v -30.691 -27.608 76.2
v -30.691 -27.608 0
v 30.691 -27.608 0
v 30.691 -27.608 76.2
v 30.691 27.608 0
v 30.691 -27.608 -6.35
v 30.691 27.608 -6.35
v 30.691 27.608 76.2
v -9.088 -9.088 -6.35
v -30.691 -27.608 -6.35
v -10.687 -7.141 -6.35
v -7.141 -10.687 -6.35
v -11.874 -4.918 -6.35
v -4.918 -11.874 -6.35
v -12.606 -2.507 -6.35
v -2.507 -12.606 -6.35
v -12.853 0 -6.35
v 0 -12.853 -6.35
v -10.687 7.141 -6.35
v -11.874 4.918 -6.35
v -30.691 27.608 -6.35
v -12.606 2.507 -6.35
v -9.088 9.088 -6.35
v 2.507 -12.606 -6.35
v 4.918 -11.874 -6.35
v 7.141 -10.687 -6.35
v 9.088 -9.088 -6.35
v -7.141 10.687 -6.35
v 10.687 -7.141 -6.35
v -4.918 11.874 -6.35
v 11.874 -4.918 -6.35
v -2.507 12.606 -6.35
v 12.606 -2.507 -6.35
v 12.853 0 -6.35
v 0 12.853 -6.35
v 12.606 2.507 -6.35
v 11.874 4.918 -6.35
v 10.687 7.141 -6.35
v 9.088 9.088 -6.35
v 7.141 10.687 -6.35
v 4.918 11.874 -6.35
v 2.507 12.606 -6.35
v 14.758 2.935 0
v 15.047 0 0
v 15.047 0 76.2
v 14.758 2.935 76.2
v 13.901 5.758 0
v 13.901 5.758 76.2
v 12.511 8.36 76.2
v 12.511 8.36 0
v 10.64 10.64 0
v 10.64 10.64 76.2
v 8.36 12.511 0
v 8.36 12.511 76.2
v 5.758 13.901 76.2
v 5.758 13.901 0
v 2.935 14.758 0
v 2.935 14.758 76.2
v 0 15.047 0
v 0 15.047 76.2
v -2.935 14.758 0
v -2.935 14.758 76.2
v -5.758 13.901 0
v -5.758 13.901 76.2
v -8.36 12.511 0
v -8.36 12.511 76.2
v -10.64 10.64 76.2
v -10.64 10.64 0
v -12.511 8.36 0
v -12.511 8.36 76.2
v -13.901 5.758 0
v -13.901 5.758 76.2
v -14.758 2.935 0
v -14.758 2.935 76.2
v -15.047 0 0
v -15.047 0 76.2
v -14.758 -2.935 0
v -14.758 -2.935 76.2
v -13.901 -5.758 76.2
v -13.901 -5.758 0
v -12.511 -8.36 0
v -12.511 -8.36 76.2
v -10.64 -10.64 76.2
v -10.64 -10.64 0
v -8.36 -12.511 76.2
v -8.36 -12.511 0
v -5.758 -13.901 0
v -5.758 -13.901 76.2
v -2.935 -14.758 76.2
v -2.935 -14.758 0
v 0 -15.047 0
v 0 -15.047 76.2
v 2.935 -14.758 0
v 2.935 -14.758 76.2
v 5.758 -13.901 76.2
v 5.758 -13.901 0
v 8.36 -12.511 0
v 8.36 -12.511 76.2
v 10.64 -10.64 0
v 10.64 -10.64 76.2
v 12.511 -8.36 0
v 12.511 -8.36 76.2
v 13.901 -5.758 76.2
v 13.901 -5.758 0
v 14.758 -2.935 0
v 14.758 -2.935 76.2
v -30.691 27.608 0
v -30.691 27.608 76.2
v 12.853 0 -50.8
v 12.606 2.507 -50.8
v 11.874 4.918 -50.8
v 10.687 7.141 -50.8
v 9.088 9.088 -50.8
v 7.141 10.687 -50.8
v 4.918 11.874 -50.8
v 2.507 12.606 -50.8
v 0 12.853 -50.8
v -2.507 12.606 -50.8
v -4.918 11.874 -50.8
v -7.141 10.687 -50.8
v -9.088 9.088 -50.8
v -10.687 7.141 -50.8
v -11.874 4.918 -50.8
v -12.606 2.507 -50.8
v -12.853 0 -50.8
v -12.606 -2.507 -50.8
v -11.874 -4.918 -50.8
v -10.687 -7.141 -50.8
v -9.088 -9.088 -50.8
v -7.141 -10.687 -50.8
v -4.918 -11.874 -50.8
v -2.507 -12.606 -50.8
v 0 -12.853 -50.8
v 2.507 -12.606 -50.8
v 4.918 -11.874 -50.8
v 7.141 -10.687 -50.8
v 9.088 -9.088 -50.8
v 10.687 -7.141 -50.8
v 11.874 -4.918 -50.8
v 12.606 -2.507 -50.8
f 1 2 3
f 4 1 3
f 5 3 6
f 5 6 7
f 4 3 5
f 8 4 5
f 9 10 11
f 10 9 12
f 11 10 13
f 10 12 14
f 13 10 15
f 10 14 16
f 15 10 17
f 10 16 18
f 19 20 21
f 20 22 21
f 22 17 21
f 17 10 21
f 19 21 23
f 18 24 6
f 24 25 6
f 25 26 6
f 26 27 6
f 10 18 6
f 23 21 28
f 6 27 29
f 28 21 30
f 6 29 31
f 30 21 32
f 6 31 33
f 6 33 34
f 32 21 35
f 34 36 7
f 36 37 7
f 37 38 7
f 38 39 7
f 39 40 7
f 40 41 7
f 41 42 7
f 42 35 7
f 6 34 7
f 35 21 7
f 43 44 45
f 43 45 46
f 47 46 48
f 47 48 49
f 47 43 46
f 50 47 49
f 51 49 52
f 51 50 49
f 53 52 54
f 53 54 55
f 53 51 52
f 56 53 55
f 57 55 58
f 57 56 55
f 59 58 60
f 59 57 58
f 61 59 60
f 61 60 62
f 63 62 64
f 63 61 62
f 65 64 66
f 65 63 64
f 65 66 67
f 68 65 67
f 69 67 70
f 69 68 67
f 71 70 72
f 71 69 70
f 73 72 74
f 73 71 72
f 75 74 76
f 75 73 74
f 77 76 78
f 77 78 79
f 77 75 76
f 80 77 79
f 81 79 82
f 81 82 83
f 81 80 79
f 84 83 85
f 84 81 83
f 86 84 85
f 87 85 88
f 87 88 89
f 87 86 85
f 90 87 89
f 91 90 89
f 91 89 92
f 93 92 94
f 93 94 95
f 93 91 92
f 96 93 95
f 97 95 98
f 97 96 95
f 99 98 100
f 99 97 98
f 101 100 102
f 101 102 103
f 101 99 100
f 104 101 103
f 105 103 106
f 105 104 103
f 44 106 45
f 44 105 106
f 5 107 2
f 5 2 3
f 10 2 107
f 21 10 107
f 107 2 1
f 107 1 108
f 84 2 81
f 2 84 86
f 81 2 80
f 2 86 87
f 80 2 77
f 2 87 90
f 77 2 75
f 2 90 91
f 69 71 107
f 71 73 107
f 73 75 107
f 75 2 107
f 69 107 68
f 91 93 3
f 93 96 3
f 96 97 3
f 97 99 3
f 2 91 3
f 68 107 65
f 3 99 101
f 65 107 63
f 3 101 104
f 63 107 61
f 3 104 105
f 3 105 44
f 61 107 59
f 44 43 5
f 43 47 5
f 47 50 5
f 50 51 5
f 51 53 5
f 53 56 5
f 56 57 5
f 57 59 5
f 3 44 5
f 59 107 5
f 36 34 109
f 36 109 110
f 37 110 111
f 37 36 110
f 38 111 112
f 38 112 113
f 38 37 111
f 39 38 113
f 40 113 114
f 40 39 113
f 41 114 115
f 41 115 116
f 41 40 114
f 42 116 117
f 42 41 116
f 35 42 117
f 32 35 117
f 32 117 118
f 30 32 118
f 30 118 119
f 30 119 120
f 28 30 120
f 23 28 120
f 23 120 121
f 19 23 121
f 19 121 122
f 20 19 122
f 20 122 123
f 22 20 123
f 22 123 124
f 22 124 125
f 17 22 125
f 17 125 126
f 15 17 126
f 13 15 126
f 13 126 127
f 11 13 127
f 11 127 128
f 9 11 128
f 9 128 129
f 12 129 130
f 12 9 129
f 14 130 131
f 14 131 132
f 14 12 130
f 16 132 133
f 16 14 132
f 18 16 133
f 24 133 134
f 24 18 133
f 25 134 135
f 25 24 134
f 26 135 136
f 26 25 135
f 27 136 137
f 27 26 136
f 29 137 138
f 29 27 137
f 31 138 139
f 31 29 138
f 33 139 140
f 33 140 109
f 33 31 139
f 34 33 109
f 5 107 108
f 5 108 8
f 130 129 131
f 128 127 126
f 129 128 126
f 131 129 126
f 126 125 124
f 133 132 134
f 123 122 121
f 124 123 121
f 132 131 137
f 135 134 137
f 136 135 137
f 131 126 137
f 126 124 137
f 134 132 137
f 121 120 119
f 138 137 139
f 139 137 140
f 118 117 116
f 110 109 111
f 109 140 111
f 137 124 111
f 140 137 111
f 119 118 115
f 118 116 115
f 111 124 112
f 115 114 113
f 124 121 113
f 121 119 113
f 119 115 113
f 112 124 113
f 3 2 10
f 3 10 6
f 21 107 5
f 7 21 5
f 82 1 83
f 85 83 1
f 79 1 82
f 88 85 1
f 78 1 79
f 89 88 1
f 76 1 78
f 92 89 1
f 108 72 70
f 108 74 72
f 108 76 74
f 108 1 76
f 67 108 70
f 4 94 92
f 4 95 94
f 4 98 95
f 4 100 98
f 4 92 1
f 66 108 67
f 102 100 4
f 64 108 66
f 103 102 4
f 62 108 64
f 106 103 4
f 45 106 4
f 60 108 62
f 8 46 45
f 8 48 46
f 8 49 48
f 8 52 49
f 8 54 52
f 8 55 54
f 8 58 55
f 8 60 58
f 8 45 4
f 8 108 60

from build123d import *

# Parameters (mm, degrees)
F0_W     = 61.3812096417
F0_H     = 55.2162826061
F0_R     = 15.0467047404
F1_DEPTH = 76.2
F0_R_2   = 12.8526590503
F2_DEPTH = 50.8
F3_DEPTH = 6.35


with BuildPart() as f1:
    # F0 (on Top) → F1 (new body)
    with BuildSketch(Plane.XY):
        Rectangle(F0_W, F0_H)
        Circle(F0_R, mode=Mode.SUBTRACT)
    extrude(amount=F1_DEPTH)


with BuildPart() as f2:
    # F0 (on Top) → F2 (new body)
    with BuildSketch(Plane.XY):
        Circle(F0_R_2)
    extrude(amount=-F2_DEPTH)

    # F0 (on Top) → F3 (join)
    with BuildSketch(Plane.XY):
        Rectangle(F0_W, F0_H)
        Circle(F0_R, mode=Mode.SUBTRACT)
        Circle(F0_R)
        Circle(F0_R_2, mode=Mode.SUBTRACT)
    extrude(amount=-F3_DEPTH)


solid = Compound([f1.part, f2.part])
